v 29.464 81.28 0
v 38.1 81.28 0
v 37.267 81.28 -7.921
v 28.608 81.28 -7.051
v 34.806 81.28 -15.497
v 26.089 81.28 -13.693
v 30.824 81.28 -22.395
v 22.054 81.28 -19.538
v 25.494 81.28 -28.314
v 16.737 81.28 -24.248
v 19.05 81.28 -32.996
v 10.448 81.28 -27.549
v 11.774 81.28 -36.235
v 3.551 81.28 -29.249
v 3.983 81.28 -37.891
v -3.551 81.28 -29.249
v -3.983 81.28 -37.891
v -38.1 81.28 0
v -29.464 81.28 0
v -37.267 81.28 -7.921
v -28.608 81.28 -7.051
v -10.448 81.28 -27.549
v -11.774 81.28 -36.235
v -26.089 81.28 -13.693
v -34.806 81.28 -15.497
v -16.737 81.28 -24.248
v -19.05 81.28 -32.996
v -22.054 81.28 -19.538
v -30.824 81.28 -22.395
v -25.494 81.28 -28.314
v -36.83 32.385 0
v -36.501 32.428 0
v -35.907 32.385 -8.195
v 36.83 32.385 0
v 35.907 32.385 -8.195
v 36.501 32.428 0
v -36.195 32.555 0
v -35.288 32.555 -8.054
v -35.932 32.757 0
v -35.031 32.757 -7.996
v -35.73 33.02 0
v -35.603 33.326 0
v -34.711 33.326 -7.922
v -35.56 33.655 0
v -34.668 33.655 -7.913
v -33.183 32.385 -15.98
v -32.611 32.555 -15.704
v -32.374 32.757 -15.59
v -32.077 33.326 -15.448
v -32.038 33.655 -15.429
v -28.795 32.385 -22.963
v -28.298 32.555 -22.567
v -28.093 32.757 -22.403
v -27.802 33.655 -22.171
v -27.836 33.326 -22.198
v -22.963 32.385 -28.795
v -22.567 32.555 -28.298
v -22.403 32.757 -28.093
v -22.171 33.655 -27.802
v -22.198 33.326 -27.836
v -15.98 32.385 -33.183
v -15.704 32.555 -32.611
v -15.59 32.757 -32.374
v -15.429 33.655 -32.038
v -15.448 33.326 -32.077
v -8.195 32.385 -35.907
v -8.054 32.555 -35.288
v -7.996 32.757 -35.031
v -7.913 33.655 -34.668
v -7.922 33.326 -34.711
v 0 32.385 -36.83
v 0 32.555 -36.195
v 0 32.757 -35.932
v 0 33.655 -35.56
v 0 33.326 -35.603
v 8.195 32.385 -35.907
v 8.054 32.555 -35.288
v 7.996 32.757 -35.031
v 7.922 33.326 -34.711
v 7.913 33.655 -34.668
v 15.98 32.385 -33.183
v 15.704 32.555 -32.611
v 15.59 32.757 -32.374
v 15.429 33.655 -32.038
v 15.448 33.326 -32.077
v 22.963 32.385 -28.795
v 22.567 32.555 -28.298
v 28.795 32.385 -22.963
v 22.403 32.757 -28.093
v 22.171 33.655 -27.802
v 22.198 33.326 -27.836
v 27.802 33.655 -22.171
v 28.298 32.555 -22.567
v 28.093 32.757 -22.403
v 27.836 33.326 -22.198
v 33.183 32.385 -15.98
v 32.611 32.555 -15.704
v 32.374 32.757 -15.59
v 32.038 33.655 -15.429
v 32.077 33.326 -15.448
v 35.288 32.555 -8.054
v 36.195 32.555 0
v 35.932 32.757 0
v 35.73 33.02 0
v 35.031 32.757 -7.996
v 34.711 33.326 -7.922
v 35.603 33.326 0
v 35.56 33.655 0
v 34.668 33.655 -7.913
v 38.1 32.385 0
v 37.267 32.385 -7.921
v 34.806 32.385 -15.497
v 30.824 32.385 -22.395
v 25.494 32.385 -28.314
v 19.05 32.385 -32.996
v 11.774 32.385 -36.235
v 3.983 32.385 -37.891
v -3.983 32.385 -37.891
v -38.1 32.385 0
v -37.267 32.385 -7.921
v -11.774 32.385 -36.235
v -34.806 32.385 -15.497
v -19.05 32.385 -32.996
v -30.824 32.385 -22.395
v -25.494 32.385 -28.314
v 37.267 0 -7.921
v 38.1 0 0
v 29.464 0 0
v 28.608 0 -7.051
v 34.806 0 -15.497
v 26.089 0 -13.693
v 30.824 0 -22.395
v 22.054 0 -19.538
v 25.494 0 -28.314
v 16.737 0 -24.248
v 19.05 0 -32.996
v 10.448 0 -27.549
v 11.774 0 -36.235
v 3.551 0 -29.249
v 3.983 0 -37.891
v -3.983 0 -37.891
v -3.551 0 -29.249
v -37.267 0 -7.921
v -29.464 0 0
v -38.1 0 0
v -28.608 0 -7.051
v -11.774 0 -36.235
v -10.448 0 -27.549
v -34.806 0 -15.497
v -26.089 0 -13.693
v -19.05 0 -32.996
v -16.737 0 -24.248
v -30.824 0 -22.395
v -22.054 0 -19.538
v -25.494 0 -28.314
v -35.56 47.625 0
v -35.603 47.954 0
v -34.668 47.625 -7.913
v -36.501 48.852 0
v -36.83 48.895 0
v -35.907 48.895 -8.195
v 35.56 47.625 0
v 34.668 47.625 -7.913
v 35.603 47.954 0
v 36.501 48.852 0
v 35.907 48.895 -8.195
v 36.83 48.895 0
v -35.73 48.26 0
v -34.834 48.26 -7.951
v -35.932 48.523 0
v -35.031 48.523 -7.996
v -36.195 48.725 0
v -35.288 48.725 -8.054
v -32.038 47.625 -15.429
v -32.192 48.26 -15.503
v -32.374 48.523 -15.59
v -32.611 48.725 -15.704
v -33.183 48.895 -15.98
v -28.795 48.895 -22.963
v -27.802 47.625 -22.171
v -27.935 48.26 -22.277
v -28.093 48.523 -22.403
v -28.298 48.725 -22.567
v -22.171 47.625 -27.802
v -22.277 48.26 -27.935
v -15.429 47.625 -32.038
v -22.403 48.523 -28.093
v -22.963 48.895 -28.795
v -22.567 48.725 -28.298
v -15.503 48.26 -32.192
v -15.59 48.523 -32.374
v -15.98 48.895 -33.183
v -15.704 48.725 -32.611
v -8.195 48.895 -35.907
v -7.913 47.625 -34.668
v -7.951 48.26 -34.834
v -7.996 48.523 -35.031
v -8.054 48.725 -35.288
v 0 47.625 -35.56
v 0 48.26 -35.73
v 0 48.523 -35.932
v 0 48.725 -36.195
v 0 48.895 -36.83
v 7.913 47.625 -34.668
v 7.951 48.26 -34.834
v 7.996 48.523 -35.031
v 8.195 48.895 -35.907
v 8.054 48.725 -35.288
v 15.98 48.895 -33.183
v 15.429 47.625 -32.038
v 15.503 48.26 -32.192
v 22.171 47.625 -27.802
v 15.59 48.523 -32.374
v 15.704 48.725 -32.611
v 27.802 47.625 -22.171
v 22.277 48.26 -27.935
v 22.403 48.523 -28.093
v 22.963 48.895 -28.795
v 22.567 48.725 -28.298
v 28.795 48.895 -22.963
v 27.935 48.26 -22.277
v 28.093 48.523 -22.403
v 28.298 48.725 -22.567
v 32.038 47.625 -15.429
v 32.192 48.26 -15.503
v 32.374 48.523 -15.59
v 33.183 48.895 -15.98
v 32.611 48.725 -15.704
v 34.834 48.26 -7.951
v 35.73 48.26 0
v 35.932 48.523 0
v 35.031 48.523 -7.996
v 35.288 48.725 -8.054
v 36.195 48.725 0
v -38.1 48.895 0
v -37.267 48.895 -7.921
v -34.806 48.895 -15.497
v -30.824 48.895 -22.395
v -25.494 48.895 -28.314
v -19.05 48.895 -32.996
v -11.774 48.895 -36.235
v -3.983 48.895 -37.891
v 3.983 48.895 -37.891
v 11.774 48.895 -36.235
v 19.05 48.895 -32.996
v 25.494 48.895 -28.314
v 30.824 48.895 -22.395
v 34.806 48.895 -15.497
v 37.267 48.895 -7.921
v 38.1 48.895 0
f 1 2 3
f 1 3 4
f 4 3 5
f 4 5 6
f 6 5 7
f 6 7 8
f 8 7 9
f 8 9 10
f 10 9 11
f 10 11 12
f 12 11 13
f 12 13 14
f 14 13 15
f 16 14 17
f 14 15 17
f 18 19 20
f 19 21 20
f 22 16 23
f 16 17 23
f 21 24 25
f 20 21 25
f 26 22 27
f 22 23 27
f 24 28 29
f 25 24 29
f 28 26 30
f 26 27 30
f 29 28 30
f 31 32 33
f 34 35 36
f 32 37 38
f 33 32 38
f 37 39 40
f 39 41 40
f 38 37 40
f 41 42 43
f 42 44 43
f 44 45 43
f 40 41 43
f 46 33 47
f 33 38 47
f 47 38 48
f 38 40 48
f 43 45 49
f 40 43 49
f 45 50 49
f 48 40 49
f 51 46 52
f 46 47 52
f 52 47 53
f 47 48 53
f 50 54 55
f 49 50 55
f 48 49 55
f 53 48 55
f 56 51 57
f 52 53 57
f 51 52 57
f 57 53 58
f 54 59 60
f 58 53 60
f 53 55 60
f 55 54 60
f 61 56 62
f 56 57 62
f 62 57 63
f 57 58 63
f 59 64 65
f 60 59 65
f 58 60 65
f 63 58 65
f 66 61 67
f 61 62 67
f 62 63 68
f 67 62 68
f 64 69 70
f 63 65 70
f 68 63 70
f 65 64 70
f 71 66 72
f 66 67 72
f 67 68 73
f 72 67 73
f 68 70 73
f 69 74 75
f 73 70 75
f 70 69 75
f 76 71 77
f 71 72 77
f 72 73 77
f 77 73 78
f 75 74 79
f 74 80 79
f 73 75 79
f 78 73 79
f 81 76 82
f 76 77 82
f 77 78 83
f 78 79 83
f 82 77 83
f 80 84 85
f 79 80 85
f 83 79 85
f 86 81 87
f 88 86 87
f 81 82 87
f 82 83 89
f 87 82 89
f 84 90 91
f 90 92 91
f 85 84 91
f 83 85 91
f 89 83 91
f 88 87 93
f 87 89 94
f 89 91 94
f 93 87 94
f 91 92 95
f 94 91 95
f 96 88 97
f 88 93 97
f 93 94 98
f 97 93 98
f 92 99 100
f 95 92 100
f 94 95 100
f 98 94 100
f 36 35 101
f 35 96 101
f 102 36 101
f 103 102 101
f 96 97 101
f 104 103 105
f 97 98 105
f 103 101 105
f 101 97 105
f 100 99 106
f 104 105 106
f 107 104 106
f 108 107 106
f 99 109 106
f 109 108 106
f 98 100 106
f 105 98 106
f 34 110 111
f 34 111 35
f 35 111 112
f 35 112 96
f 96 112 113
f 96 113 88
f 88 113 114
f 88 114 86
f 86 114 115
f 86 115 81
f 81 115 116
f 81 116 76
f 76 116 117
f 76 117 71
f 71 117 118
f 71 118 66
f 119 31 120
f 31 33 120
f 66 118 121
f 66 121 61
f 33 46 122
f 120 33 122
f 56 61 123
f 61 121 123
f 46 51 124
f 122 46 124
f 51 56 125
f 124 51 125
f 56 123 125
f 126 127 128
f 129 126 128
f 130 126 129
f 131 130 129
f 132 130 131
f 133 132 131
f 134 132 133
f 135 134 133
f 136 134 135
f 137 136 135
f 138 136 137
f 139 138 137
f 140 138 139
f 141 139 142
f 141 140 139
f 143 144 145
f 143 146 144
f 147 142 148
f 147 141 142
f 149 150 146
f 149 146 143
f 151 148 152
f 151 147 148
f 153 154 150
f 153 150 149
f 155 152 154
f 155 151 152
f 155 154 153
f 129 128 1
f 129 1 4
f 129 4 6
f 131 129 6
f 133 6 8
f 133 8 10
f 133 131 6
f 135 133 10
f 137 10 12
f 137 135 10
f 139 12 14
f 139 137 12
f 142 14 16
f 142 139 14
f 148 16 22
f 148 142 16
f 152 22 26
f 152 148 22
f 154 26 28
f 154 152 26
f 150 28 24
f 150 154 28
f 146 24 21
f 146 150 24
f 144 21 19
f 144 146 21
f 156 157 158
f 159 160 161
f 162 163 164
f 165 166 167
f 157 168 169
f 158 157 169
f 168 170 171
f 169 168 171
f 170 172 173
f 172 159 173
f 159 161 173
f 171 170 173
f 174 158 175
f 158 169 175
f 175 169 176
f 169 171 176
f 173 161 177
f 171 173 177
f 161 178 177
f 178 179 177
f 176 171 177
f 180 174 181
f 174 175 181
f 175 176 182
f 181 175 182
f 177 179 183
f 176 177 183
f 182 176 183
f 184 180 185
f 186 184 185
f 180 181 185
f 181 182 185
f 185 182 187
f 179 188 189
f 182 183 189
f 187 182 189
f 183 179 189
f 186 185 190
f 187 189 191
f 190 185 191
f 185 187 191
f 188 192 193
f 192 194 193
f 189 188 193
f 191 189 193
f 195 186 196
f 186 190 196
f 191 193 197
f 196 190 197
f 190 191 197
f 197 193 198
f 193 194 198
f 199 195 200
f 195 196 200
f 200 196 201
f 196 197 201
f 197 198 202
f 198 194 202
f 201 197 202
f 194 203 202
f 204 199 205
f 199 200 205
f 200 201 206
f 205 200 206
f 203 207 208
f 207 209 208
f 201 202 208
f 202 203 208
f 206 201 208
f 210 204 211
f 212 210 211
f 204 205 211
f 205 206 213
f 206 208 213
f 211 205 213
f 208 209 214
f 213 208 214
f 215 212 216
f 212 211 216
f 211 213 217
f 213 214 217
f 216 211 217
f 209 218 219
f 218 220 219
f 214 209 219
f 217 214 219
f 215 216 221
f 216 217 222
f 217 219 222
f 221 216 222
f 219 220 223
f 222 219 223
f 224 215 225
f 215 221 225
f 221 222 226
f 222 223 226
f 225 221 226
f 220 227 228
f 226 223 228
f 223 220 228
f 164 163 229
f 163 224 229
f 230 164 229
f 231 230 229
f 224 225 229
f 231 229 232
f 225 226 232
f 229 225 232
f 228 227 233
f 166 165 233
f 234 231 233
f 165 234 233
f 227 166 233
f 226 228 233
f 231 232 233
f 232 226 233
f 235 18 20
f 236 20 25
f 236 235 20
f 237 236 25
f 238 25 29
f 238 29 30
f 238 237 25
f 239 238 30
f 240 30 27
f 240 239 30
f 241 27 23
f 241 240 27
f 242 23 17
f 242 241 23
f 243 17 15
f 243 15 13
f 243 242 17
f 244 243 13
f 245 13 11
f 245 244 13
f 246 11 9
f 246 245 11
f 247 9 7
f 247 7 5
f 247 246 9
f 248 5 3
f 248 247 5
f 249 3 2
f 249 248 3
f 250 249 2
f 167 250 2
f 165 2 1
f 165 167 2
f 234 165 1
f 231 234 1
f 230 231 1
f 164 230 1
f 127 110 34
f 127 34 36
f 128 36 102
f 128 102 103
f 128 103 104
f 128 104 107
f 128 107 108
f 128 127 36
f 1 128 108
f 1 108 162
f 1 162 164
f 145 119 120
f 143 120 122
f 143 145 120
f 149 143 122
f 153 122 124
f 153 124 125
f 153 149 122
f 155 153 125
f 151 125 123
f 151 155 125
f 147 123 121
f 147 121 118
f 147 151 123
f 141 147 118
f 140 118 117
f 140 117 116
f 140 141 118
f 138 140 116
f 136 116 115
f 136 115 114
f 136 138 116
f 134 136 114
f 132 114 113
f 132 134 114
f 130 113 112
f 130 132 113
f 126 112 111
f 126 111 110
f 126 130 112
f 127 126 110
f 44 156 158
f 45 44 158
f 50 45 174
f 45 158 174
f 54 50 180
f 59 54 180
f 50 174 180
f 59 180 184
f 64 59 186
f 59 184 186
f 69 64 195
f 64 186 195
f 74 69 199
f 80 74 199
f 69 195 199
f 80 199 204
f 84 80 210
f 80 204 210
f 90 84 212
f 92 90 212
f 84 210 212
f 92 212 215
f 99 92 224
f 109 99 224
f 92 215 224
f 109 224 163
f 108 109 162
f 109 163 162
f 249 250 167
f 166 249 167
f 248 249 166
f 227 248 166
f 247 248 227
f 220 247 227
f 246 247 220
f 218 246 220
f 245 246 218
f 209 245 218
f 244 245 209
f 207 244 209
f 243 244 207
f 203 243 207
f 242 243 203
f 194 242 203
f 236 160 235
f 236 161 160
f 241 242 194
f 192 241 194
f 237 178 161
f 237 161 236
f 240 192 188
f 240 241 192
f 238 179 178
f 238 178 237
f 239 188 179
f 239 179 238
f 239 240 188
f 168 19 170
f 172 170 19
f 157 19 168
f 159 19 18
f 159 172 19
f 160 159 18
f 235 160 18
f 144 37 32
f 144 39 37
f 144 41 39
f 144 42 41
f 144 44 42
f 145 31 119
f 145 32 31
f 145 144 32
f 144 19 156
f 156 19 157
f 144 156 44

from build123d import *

# Parameters (mm, degrees)
BOSS_EXTRUDE1_DEPTH = 81.28
SKETCH2_W           = 2.54
SKETCH2_H           = 16.51
CUT_REVOLVE1_ANGLE  = 180
FILLET1_R           = 1.27


with BuildPart() as part:
    # Sketch1 → Boss-Extrude1 (new body)
    with BuildSketch(Plane(origin=(0, 0, 0), x_dir=(1, 0, 0), z_dir=(0, 1, 0))):
        with BuildLine():
            Line((-29.464, 0), (-38.1, 0))
            ThreePointArc((-38.1, 0), (0, 38.1), (38.1, 0))
            Line((38.1, 0), (29.464, 0))
            ThreePointArc((29.464, 0), (0, 29.464), (-29.464, 0))
        make_face()
    extrude(amount=BOSS_EXTRUDE1_DEPTH)

    # Sketch2 → Cut-Revolve1 (revolve, cut)
    with BuildSketch(Plane.XY):
        with Locations((-36.83, 40.64)):
            Rectangle(SKETCH2_W, SKETCH2_H)
    revolve(axis=Axis((0, 0, 0), (0, -1, 0)), revolution_arc=CUT_REVOLVE1_ANGLE, mode=Mode.SUBTRACT)

    # Fillet1
    fillet1_edges = [part.edges().sort_by_distance(p)[0] for p in [
        (0, 48.895, -35.56),
        (0, 32.385, -35.56),
    ]]
    fillet(fillet1_edges, radius=FILLET1_R)


solid = part.part
